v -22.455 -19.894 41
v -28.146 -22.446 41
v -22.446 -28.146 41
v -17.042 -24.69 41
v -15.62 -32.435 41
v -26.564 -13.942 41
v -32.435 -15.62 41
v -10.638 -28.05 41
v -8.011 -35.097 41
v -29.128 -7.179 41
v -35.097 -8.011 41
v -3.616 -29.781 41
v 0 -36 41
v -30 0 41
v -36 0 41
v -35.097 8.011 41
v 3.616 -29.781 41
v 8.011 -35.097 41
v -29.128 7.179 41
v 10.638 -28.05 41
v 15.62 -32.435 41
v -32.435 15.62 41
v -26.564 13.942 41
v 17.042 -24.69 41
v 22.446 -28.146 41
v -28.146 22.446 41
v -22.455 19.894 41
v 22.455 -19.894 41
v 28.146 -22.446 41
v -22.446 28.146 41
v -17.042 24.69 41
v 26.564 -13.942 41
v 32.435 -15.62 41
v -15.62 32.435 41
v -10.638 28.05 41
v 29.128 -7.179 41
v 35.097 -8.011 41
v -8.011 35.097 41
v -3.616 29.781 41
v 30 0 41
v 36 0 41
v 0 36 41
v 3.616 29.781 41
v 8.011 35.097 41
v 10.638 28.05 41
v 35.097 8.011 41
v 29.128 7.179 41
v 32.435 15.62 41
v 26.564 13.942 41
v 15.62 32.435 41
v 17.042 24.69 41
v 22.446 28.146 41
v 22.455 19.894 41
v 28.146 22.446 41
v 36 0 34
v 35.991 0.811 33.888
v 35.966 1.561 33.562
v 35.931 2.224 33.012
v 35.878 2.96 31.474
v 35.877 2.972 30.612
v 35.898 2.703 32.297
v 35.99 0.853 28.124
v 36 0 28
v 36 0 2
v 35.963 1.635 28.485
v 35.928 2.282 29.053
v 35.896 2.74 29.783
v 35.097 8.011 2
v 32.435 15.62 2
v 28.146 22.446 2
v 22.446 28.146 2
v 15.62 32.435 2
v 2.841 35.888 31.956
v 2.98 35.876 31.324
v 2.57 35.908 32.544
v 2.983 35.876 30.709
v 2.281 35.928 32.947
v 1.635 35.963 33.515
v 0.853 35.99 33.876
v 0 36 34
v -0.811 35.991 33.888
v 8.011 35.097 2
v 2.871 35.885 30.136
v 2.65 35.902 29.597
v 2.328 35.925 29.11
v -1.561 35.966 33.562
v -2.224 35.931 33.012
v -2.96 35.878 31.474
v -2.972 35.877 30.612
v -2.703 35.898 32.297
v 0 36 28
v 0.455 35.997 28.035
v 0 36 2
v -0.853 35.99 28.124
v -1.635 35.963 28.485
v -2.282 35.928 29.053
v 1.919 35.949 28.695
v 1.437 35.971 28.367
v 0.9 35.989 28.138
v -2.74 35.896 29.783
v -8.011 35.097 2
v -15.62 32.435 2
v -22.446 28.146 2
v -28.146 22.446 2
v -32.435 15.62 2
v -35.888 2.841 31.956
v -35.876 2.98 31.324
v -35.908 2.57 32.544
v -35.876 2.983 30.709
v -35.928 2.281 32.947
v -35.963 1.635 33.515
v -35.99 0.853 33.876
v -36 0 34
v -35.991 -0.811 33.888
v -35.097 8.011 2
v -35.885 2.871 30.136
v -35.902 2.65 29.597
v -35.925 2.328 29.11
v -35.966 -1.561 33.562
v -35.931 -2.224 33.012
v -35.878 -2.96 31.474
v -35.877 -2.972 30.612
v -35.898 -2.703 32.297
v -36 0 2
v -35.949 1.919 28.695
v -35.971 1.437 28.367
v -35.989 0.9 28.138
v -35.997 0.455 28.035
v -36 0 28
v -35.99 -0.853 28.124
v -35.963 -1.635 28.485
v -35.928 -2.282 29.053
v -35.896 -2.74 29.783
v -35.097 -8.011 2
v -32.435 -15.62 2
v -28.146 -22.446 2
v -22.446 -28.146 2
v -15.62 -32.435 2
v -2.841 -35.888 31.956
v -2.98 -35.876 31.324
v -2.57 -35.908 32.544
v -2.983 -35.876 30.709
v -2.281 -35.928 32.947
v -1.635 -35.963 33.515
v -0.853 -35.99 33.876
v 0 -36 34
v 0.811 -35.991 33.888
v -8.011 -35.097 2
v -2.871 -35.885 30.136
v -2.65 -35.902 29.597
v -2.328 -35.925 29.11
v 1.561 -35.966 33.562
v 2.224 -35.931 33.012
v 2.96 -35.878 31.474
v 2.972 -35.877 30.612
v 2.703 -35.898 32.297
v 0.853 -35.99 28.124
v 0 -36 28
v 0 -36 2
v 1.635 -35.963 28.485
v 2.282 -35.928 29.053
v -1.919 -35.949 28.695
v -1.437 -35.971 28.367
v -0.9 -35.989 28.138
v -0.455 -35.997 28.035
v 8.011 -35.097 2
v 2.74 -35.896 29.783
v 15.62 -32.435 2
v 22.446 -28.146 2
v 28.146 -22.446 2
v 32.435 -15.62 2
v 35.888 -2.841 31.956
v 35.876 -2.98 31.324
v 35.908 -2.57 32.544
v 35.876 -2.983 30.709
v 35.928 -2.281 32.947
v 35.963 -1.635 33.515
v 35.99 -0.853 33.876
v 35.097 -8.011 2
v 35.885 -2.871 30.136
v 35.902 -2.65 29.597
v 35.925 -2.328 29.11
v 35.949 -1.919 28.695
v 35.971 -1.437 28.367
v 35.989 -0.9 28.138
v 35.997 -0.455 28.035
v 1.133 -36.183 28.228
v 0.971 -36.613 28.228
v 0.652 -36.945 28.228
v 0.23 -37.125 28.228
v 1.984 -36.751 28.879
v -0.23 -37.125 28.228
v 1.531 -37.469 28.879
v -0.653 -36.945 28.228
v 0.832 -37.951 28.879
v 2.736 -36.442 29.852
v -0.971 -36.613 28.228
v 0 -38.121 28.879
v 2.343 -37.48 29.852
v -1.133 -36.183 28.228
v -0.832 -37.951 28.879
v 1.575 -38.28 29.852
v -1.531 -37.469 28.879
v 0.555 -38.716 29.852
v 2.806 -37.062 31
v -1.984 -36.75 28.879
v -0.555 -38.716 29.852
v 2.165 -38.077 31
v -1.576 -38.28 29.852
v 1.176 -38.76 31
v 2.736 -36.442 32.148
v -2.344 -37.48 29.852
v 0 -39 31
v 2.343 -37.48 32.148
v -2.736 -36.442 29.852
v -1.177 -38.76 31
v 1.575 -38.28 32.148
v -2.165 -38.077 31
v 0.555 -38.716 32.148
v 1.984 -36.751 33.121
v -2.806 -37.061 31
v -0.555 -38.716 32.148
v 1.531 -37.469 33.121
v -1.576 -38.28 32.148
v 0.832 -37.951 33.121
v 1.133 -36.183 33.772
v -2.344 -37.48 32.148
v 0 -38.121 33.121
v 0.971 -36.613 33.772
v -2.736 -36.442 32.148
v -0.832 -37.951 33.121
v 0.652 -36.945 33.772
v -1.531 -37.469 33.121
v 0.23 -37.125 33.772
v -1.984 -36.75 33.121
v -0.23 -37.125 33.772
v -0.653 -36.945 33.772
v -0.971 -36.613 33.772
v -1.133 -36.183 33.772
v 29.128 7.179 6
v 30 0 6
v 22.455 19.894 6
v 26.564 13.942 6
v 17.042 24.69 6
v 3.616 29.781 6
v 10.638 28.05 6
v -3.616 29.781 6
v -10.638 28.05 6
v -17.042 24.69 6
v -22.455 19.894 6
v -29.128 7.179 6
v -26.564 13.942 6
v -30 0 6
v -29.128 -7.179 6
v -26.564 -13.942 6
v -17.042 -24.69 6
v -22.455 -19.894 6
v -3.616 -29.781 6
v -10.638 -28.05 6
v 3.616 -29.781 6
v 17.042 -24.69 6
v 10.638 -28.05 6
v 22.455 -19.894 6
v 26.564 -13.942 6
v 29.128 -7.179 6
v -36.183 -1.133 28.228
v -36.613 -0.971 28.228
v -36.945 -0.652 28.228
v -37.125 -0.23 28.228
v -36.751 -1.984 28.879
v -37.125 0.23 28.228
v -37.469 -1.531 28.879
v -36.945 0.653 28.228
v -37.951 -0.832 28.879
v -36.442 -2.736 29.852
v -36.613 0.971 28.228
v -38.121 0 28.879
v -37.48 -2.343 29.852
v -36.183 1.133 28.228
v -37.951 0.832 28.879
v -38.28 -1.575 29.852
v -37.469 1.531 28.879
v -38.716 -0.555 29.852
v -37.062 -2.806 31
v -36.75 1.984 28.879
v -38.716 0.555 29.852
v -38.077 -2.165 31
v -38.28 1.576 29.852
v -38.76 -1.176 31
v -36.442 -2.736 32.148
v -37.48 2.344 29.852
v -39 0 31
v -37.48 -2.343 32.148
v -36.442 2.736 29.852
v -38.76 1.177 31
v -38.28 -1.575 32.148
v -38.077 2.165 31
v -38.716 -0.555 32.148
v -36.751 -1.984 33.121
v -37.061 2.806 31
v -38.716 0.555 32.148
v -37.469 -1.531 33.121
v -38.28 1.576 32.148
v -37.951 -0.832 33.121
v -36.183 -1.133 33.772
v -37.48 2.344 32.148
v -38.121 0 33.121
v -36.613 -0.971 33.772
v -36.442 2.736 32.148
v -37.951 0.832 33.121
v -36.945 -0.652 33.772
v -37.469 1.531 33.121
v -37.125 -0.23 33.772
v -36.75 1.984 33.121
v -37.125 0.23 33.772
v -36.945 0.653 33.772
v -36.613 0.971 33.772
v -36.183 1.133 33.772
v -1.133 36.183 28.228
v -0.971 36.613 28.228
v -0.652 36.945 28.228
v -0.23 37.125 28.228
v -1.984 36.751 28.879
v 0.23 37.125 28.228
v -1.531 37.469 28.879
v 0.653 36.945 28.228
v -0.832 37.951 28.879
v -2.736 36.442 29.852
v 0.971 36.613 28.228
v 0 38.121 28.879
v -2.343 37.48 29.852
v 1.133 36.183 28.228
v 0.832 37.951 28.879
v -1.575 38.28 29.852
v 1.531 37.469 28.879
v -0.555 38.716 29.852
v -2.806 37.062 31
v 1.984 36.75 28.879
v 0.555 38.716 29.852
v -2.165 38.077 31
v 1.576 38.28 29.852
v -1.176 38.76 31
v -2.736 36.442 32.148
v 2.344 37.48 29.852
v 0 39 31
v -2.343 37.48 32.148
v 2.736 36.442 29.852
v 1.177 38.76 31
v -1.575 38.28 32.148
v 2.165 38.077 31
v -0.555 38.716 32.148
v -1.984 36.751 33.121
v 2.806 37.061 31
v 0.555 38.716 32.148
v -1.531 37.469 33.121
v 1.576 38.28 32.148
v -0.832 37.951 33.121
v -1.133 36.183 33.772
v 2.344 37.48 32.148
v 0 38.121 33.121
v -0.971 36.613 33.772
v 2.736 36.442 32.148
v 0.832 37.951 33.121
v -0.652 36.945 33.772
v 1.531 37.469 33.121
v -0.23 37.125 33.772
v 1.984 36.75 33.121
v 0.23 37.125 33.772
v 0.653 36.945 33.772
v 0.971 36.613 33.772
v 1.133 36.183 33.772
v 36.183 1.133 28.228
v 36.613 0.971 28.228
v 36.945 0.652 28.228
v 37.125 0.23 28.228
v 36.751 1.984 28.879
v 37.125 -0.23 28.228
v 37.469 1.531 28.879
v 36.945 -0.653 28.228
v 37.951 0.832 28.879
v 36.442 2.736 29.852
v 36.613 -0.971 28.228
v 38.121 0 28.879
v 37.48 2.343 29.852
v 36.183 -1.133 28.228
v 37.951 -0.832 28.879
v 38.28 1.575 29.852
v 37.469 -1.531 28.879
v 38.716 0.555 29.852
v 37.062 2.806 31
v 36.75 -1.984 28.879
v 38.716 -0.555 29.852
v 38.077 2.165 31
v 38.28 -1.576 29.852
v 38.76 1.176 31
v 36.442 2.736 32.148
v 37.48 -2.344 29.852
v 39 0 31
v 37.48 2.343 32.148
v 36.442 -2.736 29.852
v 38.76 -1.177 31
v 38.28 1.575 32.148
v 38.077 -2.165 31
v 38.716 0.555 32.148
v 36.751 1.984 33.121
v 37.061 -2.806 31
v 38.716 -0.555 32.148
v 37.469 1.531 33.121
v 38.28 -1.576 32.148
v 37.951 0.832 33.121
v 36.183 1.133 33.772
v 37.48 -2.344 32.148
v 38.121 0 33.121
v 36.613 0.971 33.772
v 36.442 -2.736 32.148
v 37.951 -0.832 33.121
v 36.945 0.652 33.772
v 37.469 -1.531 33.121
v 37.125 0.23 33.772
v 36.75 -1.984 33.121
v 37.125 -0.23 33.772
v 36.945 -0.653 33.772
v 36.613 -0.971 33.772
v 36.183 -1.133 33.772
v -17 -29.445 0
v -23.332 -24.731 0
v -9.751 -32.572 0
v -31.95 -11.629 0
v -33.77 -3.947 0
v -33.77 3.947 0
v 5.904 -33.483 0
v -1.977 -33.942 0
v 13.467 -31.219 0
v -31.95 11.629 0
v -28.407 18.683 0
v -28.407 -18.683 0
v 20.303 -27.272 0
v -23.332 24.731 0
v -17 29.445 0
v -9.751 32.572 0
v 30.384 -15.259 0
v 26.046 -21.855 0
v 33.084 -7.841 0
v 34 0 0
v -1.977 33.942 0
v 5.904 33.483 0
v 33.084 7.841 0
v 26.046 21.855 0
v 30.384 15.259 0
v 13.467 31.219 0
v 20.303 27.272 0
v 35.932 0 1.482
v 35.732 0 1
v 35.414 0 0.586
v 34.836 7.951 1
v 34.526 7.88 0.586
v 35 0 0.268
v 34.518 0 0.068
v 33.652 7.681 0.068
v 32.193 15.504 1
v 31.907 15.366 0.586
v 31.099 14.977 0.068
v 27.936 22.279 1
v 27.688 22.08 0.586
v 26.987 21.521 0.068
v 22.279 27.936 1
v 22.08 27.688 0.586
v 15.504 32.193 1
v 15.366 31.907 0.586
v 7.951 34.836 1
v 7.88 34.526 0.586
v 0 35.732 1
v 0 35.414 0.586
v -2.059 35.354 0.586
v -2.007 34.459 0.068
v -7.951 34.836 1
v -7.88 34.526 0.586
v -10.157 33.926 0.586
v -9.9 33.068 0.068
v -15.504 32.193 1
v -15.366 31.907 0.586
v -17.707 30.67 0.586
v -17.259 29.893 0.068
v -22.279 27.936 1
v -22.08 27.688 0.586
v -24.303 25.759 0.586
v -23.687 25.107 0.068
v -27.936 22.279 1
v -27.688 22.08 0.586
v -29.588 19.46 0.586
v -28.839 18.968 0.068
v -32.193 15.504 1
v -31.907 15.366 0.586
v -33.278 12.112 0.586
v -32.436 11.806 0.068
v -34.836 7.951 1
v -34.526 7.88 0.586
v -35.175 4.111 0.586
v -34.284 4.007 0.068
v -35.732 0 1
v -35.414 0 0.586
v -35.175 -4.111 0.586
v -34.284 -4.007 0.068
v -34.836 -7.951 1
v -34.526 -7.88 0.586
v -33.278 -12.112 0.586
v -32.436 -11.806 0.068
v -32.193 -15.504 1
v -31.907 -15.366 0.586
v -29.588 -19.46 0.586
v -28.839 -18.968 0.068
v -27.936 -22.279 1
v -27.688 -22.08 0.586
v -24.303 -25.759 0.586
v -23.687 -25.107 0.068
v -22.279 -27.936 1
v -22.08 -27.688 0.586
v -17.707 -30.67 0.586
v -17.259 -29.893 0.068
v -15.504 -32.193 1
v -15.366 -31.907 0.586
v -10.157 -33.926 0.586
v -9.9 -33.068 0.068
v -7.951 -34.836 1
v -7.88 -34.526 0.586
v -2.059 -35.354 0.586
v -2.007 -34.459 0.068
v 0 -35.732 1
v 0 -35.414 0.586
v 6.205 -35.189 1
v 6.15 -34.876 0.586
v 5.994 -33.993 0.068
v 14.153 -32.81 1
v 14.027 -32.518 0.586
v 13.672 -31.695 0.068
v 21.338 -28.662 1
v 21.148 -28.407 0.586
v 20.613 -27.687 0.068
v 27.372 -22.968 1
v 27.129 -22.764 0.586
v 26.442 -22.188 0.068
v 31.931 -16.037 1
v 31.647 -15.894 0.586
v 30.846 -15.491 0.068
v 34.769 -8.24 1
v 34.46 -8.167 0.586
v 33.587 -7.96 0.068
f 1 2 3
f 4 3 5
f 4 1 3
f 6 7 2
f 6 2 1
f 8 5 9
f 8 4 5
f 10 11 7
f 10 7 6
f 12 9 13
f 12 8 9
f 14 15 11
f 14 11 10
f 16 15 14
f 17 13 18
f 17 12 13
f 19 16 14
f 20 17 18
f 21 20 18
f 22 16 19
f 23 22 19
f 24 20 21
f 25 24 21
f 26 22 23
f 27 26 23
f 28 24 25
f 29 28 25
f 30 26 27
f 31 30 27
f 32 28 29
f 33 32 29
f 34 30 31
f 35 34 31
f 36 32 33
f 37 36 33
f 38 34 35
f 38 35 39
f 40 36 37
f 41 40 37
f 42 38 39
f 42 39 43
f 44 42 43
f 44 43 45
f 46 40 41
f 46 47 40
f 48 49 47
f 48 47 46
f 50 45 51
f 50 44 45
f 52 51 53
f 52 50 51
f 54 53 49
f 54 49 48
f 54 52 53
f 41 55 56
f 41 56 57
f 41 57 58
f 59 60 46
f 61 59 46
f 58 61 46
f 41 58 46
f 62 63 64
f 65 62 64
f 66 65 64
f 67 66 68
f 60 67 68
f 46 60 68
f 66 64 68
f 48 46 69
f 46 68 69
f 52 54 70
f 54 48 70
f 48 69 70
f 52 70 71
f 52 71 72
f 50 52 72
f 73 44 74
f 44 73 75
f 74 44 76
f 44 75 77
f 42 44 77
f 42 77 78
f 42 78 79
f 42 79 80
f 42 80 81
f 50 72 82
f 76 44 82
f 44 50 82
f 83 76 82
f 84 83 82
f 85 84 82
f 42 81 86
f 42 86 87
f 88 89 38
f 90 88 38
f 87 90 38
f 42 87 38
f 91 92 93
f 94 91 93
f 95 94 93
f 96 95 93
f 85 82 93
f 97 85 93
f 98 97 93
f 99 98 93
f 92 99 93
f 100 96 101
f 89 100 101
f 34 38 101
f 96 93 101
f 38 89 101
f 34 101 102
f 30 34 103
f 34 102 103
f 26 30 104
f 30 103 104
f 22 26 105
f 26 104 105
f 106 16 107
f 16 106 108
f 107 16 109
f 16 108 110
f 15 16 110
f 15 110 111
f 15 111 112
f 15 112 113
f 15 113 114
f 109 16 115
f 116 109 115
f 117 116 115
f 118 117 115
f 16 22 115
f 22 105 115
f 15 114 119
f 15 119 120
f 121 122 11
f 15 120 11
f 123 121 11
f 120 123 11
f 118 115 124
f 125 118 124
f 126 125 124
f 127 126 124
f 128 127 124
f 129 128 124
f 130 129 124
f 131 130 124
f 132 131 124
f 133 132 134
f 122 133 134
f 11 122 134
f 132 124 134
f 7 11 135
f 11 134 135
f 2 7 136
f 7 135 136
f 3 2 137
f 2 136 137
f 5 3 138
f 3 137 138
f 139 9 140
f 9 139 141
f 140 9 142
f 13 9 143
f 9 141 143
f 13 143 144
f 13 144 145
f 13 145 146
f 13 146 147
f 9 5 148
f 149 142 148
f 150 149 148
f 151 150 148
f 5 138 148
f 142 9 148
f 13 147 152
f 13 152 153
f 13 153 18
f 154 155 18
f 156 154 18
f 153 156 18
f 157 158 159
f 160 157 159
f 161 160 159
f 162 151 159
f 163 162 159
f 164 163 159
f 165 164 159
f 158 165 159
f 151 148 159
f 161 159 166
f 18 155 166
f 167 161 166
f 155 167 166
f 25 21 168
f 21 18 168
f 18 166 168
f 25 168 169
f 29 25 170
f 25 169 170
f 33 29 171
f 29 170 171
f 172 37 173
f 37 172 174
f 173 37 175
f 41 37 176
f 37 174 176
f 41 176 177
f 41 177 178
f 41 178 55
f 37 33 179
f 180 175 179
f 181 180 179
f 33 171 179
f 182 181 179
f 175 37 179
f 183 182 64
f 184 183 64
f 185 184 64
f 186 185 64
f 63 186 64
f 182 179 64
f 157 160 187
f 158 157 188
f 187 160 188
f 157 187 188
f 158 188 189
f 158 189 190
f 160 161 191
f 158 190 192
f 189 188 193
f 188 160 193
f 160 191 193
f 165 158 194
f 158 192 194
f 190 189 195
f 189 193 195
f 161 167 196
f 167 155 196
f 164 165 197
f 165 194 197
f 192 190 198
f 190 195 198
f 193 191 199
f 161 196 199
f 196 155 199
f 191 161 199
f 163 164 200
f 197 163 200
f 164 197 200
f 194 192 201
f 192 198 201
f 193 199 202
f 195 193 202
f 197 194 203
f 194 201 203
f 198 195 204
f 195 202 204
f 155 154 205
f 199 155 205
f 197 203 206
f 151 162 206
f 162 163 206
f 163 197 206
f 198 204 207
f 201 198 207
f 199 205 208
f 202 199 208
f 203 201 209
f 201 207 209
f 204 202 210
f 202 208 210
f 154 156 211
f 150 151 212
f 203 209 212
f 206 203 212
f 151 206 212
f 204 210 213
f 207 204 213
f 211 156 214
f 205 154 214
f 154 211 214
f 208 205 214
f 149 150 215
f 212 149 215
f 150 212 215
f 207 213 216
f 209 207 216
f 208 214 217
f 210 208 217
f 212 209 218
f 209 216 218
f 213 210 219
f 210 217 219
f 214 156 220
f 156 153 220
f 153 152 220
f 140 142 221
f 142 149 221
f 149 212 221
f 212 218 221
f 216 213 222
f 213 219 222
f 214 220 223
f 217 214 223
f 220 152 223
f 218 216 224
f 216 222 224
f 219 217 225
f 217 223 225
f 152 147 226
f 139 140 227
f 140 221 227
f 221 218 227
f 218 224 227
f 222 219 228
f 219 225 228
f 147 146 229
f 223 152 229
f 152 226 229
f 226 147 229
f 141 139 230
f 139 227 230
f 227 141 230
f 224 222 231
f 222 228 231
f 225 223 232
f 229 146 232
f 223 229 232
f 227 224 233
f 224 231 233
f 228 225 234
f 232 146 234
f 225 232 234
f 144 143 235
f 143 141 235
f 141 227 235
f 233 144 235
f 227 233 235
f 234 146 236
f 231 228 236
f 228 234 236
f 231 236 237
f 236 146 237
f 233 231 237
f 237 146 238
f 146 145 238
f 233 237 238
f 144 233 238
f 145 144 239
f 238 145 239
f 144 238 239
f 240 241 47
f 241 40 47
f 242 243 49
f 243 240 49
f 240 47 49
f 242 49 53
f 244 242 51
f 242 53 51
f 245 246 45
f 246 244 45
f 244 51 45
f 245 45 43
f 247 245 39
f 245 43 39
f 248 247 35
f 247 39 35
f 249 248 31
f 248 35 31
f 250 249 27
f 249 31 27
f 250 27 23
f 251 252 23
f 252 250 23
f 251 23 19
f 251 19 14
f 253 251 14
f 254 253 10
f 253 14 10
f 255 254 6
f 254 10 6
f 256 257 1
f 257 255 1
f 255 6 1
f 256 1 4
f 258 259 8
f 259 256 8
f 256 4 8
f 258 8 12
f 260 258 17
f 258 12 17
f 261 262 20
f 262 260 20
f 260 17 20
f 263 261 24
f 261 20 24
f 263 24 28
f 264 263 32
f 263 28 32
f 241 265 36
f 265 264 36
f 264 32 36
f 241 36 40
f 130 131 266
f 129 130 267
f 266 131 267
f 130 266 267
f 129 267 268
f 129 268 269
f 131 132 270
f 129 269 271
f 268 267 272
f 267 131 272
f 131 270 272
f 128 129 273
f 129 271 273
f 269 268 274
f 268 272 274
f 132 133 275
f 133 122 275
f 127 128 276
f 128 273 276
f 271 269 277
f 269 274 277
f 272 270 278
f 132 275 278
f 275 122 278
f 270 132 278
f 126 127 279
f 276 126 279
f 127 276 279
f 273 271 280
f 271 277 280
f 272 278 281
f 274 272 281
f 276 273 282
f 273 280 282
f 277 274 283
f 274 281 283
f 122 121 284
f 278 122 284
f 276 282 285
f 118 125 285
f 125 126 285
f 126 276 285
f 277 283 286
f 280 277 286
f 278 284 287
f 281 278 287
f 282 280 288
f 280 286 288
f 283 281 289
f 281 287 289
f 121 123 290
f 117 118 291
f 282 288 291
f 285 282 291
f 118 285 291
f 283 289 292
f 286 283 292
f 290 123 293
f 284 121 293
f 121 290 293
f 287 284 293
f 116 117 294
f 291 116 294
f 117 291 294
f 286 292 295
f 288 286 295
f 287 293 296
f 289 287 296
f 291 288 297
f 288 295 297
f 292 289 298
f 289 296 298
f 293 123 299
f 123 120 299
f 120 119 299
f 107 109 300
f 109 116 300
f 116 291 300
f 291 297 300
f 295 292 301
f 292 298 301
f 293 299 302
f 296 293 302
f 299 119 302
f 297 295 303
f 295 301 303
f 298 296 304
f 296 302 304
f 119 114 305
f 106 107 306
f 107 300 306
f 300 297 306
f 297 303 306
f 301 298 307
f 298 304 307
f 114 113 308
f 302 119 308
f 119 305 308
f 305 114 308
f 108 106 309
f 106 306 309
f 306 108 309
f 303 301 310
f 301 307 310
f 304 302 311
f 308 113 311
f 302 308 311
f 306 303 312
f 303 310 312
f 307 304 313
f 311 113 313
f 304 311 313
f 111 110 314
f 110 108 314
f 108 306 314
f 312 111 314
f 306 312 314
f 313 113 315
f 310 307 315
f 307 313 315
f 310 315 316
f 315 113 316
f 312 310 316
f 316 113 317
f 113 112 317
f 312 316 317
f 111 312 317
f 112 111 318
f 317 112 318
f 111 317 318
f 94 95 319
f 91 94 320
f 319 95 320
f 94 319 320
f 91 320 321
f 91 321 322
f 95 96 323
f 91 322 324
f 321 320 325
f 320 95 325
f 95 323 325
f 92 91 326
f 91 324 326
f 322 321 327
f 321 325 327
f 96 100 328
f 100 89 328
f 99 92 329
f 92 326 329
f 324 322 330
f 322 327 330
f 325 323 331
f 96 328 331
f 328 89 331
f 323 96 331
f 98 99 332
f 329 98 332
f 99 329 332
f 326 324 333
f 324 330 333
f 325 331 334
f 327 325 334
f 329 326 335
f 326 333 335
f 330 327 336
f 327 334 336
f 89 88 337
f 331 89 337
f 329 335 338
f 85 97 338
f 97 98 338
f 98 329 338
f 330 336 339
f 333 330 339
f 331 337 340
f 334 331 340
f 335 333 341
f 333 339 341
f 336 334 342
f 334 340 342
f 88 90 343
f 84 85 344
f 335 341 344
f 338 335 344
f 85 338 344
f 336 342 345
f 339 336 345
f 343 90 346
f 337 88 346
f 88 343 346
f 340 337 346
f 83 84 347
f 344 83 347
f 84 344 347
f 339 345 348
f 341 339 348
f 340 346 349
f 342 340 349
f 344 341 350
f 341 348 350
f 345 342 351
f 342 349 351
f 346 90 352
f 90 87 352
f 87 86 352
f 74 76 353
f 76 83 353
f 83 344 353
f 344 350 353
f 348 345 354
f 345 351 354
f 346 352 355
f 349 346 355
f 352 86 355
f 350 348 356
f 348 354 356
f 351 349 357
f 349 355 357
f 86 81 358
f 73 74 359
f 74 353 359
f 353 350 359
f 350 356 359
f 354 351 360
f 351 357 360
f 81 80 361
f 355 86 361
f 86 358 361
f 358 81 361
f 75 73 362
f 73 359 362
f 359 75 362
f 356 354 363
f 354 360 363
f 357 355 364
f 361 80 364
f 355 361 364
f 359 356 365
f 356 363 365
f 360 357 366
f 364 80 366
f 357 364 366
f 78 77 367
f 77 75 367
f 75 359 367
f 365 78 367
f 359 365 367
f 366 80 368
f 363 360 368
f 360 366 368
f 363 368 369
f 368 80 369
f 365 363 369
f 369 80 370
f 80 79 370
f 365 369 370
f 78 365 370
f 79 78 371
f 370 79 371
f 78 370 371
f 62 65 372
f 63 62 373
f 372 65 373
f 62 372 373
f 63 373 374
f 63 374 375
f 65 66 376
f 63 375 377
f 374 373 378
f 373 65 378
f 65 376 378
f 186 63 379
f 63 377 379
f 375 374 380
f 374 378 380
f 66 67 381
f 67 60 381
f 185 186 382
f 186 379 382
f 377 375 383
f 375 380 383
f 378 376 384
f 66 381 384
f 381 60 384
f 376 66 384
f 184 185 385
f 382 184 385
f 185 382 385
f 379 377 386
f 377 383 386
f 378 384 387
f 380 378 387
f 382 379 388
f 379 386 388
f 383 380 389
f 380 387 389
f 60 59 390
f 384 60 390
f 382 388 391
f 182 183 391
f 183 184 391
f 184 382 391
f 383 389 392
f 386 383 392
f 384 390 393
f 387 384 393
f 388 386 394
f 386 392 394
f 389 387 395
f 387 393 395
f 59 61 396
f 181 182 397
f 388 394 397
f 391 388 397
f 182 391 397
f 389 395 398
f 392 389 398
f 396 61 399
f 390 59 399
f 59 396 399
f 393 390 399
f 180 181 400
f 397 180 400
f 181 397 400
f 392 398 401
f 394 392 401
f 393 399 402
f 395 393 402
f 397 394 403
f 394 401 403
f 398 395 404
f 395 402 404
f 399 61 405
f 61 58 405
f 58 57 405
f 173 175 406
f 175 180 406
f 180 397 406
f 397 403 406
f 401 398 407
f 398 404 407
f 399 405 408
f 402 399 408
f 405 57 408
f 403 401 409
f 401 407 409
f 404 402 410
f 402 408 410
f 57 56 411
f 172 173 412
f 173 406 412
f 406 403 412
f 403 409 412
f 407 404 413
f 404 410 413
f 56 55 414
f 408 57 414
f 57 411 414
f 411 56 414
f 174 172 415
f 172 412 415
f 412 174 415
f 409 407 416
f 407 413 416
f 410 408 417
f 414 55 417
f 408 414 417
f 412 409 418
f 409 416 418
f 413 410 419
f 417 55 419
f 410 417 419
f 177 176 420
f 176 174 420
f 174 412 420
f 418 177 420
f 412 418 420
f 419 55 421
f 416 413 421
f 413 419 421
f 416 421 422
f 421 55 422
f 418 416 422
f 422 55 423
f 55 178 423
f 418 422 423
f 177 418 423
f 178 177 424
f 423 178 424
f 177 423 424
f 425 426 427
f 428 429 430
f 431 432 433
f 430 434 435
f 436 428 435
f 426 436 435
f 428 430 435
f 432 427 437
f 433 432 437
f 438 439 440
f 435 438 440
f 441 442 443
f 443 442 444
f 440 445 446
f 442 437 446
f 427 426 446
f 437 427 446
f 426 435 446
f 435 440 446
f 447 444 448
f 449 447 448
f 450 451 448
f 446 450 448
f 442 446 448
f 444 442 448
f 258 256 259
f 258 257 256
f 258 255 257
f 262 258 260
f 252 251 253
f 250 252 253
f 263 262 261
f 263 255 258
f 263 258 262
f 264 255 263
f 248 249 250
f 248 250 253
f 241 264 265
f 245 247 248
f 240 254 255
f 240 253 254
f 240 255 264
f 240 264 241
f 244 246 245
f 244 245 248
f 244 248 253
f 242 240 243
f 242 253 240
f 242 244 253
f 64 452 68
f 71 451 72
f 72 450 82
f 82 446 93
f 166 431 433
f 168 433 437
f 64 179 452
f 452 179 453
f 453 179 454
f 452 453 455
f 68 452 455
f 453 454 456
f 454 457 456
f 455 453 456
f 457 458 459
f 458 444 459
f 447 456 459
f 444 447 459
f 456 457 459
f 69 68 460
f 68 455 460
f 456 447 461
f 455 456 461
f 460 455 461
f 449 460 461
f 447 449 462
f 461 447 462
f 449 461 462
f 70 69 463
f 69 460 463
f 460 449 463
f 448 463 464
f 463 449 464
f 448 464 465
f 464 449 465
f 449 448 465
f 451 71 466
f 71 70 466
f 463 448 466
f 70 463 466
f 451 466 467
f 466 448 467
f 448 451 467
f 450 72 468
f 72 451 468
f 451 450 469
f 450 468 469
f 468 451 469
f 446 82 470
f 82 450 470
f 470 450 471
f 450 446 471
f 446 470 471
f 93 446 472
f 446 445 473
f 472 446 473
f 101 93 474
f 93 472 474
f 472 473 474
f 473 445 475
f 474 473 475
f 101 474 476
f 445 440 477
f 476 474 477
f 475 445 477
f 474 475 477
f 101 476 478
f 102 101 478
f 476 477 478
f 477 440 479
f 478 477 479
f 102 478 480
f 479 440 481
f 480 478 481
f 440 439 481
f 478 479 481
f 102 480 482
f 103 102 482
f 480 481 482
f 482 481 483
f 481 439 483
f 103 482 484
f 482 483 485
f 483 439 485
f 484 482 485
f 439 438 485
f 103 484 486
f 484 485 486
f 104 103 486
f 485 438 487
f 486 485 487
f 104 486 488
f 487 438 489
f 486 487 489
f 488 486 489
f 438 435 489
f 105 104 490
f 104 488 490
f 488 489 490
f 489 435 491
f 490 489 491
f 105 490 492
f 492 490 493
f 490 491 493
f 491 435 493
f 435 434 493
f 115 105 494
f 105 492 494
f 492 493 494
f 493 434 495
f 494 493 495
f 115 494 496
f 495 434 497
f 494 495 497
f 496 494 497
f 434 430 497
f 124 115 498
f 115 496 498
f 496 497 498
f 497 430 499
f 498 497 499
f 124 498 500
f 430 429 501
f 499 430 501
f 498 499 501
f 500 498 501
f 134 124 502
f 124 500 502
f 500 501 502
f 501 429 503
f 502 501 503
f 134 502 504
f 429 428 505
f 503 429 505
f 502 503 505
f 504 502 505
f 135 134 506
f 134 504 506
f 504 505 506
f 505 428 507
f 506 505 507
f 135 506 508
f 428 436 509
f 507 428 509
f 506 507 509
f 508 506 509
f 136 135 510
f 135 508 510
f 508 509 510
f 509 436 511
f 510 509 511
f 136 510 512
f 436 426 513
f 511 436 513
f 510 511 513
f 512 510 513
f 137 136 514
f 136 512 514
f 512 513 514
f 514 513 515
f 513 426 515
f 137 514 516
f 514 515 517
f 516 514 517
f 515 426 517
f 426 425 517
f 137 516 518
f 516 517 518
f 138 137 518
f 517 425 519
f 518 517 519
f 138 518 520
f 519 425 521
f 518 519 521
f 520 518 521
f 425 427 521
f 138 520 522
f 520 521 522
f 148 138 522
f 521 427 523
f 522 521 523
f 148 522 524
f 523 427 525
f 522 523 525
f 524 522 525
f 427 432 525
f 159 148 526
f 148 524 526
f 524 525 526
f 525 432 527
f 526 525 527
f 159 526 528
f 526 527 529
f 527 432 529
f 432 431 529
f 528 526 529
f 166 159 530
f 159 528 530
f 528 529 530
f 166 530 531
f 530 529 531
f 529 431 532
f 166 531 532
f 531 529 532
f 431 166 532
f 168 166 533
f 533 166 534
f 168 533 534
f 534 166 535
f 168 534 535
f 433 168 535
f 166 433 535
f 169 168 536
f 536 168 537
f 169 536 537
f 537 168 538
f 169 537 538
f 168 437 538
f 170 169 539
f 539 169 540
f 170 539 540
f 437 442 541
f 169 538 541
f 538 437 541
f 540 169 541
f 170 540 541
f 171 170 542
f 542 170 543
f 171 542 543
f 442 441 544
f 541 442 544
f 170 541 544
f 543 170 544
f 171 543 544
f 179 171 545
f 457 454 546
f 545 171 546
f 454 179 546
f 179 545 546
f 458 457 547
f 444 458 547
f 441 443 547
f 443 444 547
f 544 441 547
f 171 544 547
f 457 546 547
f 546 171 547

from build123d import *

# Parameters (mm, degrees)
F0_R     = 36
F1_DEPTH = 41
F2_R     = 30
F3_DEPTH = 35
F7_COUNT = 4
F8_R     = 2


with BuildPart() as f1:
    # F0 (on Top) → F1 (new body)
    with BuildSketch(Plane.XY):
        Circle(F0_R)
    extrude(amount=F1_DEPTH)

    # F2 (on face) → F3 (cut)
    with BuildSketch(Plane.XY.offset(41)):
        Circle(F2_R)
    extrude(amount=-F3_DEPTH, mode=Mode.SUBTRACT)

    # F5 (on offset) → F6 (revolve)
    with BuildSketch(Plane.YZ.offset(36)):
        with BuildLine():
            Line((0, 31), (0, 28))
            ThreePointArc((0, 28), (3, 31), (0, 34))
            Line((0, 34), (0, 31))
        make_face()
    revolve(axis=Axis((36, 0, 29.6323467046), (0, 0, -1)))

    # F7: F1 ×4 about axis
    f7_axis = Axis((0, 0, 41), (0, 0, -1))


with BuildPart() as f1_1:
    add(f1.part)
    for i in range(1, F7_COUNT):
        add(f1.part.rotate(f7_axis, i * 360 / F7_COUNT))

    # F8
    f8_edges = [f1_1.edges().sort_by_distance(p)[0] for p in [
        (-36, 0, 0),
    ]]
    fillet(f8_edges, radius=F8_R)


solid = f1_1.part
